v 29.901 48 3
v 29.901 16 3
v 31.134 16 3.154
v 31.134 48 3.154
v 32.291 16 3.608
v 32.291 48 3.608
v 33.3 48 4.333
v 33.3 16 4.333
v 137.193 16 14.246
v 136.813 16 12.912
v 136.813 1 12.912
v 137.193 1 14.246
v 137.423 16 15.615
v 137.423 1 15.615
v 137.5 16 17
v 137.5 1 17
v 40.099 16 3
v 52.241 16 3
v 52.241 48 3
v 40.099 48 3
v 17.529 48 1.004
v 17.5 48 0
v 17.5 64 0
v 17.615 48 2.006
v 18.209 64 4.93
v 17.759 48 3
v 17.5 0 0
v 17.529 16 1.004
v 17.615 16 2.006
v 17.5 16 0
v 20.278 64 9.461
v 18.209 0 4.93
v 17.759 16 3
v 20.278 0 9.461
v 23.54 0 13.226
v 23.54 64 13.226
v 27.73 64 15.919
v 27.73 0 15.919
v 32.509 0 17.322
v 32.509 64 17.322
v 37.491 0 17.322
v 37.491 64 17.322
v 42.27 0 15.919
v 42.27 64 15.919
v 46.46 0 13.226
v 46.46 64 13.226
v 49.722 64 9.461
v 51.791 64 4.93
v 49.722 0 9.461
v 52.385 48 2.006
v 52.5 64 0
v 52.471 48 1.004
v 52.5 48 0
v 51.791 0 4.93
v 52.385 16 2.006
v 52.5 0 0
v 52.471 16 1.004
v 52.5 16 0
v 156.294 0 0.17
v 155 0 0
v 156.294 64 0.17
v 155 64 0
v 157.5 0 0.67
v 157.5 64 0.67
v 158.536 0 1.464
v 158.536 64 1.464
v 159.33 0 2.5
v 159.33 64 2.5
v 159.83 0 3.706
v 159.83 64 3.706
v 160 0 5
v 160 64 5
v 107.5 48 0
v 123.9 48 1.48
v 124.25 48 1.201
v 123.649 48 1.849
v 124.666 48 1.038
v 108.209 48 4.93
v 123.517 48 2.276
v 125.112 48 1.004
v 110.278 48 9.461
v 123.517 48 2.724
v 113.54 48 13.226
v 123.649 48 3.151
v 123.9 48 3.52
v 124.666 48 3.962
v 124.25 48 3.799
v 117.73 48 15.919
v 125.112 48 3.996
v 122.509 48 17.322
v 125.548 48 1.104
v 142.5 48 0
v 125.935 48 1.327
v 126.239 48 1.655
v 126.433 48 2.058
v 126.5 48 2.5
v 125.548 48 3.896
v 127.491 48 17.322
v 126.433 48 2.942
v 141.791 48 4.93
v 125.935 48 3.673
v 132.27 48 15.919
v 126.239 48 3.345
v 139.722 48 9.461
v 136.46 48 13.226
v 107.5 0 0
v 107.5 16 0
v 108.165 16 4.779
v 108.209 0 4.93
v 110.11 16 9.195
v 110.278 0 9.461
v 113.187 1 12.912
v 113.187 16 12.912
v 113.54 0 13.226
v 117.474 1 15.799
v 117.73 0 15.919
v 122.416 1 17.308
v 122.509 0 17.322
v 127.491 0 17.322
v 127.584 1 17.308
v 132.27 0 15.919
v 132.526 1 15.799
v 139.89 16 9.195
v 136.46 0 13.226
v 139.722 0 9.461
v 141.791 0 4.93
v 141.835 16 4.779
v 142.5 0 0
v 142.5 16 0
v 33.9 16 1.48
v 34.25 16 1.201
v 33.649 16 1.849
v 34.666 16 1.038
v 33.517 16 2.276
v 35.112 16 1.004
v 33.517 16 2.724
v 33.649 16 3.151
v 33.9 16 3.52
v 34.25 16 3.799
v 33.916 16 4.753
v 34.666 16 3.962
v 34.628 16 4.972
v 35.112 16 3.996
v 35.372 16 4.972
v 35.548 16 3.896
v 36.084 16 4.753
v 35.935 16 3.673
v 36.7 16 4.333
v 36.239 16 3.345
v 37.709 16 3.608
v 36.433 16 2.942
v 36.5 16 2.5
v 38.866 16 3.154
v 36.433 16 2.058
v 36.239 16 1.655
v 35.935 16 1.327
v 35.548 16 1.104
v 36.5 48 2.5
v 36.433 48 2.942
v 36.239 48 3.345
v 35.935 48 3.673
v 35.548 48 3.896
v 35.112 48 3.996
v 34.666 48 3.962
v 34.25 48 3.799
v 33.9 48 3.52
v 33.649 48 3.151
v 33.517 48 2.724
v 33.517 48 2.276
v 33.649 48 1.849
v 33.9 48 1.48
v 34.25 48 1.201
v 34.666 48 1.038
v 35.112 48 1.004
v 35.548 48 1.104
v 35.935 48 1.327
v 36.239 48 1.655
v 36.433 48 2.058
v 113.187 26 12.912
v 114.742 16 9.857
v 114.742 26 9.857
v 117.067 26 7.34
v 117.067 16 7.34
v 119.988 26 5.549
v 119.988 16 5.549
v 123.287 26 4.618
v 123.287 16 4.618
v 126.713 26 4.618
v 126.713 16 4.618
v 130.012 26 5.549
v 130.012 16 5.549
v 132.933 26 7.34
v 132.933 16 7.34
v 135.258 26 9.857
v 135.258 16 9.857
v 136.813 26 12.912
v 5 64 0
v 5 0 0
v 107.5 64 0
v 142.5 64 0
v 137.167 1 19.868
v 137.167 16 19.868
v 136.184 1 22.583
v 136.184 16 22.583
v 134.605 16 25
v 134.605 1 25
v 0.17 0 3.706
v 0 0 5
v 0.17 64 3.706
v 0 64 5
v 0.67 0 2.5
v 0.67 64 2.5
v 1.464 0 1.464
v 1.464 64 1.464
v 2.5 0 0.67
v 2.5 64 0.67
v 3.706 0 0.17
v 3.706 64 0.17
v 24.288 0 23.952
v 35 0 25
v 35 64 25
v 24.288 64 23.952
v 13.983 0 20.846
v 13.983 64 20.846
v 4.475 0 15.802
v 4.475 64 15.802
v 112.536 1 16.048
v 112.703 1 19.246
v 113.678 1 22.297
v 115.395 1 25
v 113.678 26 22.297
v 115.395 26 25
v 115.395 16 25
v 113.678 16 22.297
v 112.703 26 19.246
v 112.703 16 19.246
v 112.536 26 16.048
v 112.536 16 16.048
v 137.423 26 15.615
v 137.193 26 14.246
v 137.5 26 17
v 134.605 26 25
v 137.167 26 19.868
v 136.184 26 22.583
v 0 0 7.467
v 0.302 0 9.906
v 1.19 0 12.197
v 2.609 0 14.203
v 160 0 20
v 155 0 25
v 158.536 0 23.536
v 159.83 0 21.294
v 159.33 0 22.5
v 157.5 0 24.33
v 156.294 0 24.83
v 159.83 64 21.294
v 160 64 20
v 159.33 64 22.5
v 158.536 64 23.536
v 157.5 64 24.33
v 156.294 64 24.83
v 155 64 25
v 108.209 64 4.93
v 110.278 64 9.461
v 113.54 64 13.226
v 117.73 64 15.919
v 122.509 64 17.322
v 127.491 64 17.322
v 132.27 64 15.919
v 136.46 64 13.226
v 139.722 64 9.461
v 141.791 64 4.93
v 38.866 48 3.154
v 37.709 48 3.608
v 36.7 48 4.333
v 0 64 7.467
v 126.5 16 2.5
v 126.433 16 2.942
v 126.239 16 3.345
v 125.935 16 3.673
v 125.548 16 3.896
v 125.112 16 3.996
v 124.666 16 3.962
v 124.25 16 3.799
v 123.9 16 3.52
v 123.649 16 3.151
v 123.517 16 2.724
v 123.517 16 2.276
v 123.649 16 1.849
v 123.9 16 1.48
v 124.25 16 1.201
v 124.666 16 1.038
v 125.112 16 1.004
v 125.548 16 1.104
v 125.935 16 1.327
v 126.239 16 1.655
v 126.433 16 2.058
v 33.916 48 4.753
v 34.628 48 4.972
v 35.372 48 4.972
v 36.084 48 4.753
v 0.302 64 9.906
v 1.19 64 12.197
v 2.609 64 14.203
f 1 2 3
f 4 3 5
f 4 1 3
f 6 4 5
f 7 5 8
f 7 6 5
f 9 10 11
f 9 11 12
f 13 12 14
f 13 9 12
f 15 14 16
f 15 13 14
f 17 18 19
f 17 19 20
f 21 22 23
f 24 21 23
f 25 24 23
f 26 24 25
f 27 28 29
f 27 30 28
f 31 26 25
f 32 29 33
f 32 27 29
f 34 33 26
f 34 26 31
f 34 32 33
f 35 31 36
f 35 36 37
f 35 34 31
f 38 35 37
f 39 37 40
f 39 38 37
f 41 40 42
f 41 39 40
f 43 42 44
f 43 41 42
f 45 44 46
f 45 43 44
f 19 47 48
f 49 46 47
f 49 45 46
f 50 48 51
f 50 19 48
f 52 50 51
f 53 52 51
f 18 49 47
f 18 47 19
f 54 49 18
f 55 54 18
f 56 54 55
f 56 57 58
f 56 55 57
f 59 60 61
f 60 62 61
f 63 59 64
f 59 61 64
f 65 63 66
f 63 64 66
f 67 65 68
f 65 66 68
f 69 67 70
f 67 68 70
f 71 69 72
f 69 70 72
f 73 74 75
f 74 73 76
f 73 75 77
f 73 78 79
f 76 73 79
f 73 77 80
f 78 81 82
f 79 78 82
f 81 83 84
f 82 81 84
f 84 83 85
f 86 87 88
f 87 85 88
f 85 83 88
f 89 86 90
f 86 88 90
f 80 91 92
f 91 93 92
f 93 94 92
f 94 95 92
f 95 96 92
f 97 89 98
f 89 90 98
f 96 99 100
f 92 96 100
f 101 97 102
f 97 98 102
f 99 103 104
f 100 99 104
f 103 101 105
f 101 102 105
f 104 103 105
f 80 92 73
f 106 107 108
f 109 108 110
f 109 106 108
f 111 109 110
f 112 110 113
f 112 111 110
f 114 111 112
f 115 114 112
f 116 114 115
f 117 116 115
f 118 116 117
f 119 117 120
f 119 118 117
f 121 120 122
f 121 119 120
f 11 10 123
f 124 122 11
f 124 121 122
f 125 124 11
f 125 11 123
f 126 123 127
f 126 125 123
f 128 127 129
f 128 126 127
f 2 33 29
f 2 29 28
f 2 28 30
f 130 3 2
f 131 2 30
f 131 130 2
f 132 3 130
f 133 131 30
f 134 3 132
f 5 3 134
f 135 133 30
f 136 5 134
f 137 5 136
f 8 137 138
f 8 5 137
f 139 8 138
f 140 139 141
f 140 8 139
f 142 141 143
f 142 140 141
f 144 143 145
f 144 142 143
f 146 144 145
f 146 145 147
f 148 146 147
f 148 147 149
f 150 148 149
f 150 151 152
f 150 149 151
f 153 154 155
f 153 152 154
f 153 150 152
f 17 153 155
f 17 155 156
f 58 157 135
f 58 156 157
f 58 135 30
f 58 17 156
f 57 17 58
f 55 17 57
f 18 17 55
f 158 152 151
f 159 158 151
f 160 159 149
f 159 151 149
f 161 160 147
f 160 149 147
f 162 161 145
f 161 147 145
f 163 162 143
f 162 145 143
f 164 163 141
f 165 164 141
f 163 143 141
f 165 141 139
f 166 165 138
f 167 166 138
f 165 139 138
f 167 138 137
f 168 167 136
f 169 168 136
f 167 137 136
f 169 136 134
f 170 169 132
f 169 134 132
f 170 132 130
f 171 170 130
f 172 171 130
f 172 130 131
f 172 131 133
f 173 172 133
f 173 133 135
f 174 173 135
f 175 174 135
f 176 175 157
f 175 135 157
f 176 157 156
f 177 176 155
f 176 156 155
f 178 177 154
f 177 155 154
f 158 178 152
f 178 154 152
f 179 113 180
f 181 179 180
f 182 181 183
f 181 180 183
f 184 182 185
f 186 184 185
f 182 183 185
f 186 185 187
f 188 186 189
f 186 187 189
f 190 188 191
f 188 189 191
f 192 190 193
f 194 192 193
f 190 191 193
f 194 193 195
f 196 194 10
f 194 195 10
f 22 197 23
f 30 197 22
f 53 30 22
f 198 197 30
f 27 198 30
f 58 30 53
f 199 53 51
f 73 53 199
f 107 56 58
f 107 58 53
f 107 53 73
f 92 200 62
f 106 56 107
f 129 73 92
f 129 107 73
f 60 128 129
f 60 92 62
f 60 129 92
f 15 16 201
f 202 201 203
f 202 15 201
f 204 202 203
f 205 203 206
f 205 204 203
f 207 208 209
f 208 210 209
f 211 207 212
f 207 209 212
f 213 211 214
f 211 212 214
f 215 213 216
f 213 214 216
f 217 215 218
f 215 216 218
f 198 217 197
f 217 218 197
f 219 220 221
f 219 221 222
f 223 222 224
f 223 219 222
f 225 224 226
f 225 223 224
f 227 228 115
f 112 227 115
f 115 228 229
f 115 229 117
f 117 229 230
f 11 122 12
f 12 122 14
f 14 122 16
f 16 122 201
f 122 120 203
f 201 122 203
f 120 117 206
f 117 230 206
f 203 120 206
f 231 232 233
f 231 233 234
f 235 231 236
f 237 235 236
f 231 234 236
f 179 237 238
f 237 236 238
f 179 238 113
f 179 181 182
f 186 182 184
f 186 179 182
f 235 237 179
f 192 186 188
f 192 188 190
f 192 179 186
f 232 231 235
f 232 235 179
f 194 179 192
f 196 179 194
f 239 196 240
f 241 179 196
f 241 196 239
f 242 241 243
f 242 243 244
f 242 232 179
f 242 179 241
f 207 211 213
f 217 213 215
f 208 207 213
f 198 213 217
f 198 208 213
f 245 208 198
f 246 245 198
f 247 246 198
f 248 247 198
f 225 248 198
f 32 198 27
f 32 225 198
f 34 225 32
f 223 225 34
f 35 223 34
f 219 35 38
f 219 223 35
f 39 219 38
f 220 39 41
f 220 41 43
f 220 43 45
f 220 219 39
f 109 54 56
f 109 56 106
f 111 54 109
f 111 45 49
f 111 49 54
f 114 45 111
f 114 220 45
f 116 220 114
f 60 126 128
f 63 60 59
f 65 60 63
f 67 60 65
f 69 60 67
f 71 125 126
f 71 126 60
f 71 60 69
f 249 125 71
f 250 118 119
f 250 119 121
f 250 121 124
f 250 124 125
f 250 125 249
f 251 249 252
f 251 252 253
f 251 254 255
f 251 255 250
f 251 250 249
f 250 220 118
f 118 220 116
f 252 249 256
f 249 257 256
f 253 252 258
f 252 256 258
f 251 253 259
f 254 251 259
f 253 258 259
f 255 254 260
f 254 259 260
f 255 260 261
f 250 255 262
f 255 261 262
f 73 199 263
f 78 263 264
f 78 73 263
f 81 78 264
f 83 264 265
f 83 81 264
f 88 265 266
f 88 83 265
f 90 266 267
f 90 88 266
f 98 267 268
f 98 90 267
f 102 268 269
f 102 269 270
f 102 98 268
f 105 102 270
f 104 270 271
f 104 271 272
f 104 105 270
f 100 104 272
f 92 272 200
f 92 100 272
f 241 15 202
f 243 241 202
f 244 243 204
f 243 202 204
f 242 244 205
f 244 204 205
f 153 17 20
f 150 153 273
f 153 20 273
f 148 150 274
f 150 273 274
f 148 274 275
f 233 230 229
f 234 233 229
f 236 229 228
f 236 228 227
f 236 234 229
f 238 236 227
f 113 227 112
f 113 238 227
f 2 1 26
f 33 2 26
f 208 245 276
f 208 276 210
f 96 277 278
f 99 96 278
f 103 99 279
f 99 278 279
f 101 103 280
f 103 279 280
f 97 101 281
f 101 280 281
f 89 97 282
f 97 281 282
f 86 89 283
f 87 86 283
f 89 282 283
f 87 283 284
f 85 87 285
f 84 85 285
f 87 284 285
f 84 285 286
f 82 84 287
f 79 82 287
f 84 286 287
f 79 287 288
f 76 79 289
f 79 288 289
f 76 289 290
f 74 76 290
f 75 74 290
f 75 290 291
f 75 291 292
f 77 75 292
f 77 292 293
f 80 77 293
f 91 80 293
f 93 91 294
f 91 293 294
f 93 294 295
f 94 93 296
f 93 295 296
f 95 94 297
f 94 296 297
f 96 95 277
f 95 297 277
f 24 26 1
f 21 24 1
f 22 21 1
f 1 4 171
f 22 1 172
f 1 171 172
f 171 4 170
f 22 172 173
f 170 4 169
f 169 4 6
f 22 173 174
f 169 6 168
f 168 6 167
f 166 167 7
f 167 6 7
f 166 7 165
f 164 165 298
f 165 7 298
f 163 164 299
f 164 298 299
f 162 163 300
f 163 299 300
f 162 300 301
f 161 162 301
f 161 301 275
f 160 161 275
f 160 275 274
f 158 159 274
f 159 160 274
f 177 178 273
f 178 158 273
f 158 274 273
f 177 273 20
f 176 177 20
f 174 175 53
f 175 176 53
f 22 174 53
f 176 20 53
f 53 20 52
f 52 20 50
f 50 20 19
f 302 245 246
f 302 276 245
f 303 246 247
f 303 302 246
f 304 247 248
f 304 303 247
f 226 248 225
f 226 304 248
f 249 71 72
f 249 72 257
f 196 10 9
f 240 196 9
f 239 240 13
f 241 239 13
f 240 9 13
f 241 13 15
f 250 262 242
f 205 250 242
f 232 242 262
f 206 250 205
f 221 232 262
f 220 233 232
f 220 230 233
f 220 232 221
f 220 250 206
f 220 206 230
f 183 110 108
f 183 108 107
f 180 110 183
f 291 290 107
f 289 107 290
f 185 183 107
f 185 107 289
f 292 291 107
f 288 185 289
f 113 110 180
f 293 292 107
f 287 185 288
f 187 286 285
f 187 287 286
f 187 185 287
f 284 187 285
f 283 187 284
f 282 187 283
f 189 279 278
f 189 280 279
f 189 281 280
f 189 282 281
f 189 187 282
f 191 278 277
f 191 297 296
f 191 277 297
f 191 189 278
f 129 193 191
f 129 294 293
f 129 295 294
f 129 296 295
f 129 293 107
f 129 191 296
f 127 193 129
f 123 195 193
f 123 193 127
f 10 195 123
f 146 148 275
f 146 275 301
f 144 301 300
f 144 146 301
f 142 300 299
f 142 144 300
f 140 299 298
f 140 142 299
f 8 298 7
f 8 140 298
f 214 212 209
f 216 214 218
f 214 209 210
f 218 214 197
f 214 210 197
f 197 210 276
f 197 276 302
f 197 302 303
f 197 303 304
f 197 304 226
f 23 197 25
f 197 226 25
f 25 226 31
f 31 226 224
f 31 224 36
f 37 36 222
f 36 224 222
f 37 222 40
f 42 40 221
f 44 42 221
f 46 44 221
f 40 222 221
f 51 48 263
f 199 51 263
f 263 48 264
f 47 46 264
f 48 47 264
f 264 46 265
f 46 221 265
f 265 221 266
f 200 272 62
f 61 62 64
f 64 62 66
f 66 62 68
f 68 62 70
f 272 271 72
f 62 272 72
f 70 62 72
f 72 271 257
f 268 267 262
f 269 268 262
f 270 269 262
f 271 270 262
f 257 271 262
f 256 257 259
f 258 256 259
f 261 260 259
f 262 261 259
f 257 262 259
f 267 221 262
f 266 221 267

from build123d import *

# Parameters (mm, degrees)
F1_DEPTH      = 64
F2_R          = 5
F3_R          = 10
F5_R          = 1.5
F6_DEPTH      = 32
F7_R          = 5
F9_DEPTH      = 10
F9_DEPTH_BACK = 15


with BuildPart() as f1:
    # F0 (on Front) → F1 (new body)
    with BuildSketch(Plane.XZ):
        with BuildLine():
            Line((0, 12.5), (0, 0))
            Line((0, 0), (17.5, 0))
            ThreePointArc((17.5, 0), (35, 17.5), (52.5, 0))
            Line((52.5, 0), (107.5, 0))
            ThreePointArc((107.5, 0), (125, 17.5), (142.5, 0))
            Line((142.5, 0), (160, 0))
            Line((160, 0), (160, 25))
            Line((160, 25), (35, 25))
            ThreePointArc((35, 25), (16.4174140659, 21.7812406156), (0, 12.5))
        make_face()
    extrude(amount=-F1_DEPTH)

    # F2
    f2_edges = [f1.edges().sort_by_distance(p)[0] for p in [
        (160, 32, 25),
        (0, 32, 0),
        (160, 32, 0),
    ]]
    fillet(f2_edges, radius=F2_R)

    # F3
    f3_edges = [f1.edges().sort_by_distance(p)[0] for p in [
        (0, 32, 12.5),
    ]]
    fillet(f3_edges, radius=F3_R)

    # F5 (on offset) → F6 (join)
    with BuildSketch(Plane.XZ.offset(-16)):
        with BuildLine():
            Line((17.5, 0), (52.5, 0))
            ThreePointArc((52.5, 0), (52.4351146235, 1.5055823014), (52.2409396496, 3))
            Line((52.2409396496, 3), (37.4494897428, 3))
            ThreePointArc((37.4494897428, 3), (35, 5), (32.5505102572, 3))
            Line((32.5505102572, 3), (17.7590603504, 3))
            ThreePointArc((17.7590603504, 3), (17.5648853765, 1.5055823014), (17.5, 0))
        make_face()
        with Locations((35, 2.5)):
            Circle(F5_R, mode=Mode.SUBTRACT)
        with BuildLine():
            Line((107.5, 0), (142.5, 0))
            ThreePointArc((142.5, 0), (125, 17.5), (107.5, 0))
        make_face()
        with Locations((125, 2.5)):
            Circle(F5_R, mode=Mode.SUBTRACT)
    extrude(amount=-F6_DEPTH)

    # F7
    f7_edges = [f1.edges().sort_by_distance(p)[0] for p in [
        (37.44949, 32, 3),
        (32.55051, 32, 3),
    ]]
    fillet(f7_edges, radius=F7_R)

    # F8 (on offset) → F9 (cut, two sides)
    with BuildSketch(Plane.XZ.offset(-16)) as f9_sk:
        with BuildLine():
            ThreePointArc((113.1874502253, 12.9117647059), (125, 4.5), (136.8125497747, 12.9117647059))
            ThreePointArc((136.8125497747, 12.9117647059), (125, 17.5), (113.1874502253, 12.9117647059))
        make_face()
        with BuildLine():
            ThreePointArc((113.1874502253, 12.9117647059), (125, 17.5), (136.8125497747, 12.9117647059))
            ThreePointArc((136.8125497747, 12.9117647059), (137.3269394455, 14.9271845456), (137.5, 17))
            ThreePointArc((137.5, 17), (122.9271845456, 29.3269394455), (113.1874502253, 12.9117647059))
        make_face()
    extrude(amount=-F9_DEPTH, mode=Mode.SUBTRACT)
    extrude(f9_sk.sketch, amount=F9_DEPTH_BACK, mode=Mode.SUBTRACT)


solid = f1.part
